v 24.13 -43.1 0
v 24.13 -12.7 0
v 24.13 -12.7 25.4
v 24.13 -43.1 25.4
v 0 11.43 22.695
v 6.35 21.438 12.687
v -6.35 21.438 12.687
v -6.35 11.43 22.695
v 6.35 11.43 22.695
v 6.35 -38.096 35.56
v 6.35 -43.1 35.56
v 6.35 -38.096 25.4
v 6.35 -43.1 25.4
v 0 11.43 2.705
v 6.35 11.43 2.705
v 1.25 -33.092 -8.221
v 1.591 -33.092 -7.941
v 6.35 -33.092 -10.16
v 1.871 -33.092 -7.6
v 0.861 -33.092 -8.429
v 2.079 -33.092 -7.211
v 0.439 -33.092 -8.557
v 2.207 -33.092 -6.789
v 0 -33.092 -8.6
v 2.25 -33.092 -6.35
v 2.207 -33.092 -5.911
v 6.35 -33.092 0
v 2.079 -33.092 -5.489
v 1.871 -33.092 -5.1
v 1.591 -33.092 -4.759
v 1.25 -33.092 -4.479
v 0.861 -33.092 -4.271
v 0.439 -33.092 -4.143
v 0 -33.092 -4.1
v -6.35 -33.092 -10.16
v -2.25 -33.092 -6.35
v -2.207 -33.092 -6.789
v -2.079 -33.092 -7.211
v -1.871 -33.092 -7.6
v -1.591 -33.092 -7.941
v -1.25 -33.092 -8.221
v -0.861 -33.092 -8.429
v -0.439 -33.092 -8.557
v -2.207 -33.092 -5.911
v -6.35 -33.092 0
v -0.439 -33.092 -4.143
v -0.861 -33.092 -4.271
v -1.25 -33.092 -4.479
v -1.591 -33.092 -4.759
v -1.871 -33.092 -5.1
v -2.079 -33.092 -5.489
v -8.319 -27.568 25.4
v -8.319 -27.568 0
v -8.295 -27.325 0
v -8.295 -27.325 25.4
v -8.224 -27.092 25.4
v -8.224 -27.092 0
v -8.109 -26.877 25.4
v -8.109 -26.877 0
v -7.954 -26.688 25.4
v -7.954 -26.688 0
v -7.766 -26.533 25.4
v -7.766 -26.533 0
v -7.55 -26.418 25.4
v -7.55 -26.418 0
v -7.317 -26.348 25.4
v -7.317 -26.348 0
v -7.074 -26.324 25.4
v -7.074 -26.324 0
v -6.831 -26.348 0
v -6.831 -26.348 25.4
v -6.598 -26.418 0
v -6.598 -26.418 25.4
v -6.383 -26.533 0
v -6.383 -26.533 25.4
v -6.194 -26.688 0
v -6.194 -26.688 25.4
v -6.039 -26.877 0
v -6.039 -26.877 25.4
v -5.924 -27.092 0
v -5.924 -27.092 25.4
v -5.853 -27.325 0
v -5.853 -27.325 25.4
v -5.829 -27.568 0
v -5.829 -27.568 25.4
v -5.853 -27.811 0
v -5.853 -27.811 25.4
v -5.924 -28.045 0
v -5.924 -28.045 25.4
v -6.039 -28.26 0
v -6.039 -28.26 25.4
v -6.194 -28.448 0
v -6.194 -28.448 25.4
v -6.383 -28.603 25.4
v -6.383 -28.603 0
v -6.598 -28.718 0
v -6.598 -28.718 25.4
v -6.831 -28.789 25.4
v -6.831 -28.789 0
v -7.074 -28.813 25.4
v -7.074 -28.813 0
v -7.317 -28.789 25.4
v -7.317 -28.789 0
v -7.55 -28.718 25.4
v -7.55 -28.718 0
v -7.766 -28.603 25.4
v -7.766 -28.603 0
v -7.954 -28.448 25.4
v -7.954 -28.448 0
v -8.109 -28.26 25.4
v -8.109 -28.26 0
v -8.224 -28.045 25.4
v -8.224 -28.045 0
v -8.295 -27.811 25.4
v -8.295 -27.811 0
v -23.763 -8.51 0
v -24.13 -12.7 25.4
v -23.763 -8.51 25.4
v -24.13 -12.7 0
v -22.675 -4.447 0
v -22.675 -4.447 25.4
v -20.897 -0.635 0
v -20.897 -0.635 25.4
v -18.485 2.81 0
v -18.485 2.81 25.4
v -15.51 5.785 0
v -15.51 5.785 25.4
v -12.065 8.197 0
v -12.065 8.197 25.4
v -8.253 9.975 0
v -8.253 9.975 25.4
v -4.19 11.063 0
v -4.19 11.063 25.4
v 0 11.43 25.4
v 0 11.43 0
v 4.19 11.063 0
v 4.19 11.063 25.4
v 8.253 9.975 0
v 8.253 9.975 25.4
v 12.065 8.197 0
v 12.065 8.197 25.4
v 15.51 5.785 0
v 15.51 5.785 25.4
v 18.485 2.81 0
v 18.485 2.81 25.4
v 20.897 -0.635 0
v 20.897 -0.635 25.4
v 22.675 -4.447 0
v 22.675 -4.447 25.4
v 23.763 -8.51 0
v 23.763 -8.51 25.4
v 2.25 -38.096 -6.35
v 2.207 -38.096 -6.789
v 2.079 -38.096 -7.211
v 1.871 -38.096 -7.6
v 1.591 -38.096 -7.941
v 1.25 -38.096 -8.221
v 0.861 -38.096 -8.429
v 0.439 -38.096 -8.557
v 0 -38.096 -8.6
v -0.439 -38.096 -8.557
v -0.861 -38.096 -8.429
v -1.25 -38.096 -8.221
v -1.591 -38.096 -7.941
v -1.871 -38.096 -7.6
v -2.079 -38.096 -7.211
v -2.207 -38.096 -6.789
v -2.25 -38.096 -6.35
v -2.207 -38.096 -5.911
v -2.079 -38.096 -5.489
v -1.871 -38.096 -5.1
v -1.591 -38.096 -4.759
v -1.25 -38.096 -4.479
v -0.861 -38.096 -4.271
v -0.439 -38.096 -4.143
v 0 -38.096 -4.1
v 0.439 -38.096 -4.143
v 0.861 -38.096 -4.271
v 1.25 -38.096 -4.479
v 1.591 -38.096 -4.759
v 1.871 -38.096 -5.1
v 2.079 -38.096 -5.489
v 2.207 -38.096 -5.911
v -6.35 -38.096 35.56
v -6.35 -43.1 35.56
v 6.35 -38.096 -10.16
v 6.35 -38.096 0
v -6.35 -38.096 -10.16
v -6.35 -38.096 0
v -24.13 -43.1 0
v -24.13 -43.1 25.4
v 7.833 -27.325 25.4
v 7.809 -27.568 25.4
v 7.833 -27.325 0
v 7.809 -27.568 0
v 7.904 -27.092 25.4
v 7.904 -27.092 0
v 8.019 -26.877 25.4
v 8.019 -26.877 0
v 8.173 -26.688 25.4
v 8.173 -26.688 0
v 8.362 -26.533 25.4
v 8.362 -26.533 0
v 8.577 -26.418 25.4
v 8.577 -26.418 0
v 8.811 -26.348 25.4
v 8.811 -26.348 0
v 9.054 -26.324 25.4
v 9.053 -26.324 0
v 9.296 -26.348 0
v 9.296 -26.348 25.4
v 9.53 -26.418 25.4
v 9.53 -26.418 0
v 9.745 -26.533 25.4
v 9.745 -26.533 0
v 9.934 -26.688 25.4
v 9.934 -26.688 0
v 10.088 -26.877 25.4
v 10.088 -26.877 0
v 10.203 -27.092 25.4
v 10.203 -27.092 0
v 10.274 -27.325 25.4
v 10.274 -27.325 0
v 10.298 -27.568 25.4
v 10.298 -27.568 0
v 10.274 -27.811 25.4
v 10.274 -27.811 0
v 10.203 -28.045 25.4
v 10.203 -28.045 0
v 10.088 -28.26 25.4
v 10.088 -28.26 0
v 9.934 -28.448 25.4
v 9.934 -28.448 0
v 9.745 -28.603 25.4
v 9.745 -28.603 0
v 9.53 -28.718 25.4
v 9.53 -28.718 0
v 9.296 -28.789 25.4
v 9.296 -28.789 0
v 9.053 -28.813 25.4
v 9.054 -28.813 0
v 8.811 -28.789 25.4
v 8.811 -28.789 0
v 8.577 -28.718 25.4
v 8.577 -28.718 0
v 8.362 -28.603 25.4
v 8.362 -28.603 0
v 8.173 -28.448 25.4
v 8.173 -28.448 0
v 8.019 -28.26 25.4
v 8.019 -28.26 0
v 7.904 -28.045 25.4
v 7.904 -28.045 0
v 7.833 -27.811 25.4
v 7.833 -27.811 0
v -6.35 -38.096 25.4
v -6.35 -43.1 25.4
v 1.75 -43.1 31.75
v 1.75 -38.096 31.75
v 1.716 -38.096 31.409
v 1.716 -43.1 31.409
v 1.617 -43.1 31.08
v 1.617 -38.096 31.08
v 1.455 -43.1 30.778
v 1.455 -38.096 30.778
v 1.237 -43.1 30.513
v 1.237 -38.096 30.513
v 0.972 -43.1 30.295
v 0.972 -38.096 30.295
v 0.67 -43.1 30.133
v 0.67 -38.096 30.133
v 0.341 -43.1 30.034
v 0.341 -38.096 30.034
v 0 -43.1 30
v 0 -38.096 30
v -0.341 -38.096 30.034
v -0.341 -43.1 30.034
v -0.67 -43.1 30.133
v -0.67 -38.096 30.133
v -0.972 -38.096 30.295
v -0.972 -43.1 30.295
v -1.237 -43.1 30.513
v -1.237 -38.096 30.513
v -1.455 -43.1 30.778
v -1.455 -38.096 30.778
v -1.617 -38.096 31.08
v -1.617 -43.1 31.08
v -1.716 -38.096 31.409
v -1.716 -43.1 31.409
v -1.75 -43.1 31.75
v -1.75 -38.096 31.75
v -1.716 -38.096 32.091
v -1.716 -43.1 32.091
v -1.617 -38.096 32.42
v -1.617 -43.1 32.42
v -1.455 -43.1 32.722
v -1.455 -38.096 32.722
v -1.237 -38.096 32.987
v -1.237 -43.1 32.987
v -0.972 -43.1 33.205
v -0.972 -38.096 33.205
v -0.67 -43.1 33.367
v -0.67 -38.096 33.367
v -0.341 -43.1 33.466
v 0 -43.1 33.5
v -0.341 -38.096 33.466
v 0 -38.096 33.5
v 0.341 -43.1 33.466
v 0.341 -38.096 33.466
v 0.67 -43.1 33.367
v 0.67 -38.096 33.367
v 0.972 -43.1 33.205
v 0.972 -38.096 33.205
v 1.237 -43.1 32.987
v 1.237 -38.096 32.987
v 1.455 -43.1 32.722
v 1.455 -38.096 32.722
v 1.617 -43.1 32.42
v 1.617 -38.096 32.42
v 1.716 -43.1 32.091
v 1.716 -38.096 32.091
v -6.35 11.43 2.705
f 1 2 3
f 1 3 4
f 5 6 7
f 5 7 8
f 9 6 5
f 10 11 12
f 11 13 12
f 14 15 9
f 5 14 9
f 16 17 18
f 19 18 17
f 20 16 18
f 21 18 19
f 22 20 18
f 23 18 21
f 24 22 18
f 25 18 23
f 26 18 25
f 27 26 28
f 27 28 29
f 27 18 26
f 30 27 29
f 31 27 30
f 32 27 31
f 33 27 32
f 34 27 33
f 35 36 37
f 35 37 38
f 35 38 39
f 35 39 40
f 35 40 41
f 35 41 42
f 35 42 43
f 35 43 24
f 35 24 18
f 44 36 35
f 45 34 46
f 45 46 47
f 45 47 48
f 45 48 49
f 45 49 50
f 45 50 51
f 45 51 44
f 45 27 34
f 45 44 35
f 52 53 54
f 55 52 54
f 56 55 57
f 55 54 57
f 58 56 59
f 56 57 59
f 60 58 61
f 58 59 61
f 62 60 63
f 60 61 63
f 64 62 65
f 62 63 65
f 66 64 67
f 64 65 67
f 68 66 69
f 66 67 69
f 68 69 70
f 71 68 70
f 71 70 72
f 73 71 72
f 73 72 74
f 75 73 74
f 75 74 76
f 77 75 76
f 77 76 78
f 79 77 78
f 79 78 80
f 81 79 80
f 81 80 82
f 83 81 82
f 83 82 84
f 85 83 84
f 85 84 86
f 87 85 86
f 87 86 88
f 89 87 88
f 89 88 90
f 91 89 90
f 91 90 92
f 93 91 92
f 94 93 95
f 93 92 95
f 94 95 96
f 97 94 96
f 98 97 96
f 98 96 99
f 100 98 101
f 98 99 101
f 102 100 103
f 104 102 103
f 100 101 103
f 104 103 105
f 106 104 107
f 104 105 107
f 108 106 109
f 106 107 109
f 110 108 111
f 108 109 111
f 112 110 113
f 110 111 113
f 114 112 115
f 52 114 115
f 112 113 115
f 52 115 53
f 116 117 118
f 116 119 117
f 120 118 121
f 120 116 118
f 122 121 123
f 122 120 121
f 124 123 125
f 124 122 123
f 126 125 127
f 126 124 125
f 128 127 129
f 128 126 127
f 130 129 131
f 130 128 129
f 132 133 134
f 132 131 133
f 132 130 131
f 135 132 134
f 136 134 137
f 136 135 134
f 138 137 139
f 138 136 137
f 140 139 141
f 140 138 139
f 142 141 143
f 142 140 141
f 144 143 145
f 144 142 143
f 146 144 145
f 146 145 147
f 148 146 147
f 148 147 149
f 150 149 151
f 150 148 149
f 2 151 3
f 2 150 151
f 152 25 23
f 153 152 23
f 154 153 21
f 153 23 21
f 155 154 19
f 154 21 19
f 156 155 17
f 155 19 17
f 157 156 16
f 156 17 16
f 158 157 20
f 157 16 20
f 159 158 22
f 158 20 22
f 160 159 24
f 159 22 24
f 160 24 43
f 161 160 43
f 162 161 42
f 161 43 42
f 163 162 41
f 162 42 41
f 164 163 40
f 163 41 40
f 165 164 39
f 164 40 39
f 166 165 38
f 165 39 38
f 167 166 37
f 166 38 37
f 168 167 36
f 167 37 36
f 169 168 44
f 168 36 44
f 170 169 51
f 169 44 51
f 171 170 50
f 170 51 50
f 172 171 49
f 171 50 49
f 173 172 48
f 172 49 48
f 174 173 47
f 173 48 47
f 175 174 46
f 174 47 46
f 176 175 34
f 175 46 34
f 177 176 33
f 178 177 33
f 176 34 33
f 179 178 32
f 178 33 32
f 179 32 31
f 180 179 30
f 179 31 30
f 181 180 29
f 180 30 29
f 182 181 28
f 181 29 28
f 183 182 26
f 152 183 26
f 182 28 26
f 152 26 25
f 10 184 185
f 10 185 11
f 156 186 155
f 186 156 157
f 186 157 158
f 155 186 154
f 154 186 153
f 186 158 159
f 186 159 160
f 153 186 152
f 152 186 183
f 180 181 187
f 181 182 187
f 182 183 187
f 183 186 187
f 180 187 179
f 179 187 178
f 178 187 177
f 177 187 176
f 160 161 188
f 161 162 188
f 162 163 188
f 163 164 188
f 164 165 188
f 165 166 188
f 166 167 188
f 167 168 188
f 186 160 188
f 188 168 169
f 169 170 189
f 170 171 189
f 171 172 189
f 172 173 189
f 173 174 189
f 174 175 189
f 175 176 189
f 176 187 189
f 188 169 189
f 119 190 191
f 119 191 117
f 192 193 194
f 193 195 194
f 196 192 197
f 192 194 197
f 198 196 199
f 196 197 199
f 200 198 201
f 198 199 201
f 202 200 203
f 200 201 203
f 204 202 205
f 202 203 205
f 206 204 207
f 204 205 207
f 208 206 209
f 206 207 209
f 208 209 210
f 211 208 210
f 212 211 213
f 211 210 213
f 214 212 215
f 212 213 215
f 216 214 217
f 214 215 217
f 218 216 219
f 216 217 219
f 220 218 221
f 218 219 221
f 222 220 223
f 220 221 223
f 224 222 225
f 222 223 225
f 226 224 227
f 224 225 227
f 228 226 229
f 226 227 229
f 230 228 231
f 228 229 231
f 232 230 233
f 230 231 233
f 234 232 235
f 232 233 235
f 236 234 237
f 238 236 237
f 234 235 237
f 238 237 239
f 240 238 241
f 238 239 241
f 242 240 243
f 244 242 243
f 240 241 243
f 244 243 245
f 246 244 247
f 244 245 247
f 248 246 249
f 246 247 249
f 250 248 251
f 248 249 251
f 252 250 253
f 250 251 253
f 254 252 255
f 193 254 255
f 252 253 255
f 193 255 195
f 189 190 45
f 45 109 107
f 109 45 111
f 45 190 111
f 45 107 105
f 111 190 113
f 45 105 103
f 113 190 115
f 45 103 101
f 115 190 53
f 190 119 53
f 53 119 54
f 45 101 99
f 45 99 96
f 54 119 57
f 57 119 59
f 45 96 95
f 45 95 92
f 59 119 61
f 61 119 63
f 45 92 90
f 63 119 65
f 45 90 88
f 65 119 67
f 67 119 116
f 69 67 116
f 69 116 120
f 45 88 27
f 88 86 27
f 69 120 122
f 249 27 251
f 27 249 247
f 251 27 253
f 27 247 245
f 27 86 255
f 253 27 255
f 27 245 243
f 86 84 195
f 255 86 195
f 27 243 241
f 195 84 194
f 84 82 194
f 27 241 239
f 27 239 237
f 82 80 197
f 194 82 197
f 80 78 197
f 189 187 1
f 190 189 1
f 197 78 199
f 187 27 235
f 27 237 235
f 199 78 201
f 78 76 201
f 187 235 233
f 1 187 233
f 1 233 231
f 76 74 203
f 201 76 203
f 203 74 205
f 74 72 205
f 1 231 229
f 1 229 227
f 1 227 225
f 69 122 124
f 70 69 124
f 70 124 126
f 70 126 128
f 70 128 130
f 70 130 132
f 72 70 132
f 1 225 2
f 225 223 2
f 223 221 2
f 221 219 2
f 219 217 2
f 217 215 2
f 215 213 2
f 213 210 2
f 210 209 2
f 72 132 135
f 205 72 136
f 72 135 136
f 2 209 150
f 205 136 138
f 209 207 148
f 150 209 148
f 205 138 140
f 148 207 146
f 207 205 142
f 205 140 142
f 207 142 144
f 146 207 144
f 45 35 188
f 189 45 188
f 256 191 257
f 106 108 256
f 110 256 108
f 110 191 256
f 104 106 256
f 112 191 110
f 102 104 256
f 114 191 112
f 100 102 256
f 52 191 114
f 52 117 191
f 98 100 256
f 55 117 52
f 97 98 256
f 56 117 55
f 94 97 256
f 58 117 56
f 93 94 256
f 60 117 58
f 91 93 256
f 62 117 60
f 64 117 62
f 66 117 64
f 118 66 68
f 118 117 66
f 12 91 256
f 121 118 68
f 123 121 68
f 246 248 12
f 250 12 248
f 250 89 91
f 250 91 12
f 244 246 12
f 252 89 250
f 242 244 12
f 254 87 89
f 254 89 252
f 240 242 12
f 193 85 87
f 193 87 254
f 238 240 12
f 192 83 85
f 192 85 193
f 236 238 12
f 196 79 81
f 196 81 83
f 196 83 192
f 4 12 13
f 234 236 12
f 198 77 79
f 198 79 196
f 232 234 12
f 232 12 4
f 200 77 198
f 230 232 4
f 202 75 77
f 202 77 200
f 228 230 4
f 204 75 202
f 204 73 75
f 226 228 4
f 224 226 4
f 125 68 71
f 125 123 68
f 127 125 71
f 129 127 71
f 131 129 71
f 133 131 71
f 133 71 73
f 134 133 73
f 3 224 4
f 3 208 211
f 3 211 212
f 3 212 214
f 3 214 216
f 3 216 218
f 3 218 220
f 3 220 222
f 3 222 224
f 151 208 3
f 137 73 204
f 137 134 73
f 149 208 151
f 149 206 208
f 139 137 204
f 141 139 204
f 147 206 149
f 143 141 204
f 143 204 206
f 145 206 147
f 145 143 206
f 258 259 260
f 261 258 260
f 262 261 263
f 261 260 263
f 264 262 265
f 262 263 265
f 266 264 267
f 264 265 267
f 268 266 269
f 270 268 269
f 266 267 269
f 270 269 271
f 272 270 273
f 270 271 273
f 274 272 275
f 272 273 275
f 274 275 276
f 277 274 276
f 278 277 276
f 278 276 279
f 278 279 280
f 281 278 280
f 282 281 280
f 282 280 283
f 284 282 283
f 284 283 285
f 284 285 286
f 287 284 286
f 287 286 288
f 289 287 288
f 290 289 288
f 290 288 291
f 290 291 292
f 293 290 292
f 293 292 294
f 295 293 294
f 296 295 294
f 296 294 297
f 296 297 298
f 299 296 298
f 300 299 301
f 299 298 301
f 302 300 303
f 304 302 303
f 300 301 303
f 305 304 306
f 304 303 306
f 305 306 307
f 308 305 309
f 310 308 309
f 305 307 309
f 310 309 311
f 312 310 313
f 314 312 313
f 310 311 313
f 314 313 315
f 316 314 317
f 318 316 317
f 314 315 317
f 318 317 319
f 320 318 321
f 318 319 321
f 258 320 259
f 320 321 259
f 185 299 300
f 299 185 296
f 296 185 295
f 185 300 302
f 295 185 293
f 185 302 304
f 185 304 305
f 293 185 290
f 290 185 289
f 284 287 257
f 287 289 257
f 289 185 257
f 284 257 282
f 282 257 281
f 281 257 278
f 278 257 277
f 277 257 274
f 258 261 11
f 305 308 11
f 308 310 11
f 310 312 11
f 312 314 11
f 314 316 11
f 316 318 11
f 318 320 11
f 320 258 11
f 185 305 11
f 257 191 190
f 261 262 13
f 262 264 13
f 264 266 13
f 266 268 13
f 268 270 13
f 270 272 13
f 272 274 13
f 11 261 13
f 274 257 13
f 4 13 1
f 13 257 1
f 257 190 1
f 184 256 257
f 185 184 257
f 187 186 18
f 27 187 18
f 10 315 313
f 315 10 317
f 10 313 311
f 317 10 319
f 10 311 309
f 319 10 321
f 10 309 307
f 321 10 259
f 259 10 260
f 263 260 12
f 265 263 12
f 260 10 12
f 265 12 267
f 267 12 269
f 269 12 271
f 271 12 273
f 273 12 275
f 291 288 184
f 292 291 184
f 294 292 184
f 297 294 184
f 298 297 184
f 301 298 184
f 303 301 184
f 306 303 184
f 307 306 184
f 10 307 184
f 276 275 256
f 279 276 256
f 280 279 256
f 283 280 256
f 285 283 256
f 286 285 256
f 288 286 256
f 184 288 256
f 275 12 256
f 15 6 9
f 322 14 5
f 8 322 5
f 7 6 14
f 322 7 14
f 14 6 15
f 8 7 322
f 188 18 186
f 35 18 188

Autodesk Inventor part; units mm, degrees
ref_plane "YZ Plane" through (0, 0, 0) normal (1, 0, 0) x (0, 1, 0)
ref_plane "XZ Plane" through (0, 0, 0) normal (0, 1, 0) x (-1, 0, 0)
sketch "Sketch1" plane through (0, 0, 0) normal (0, 0, 1) x (1, 0, 0)
  line L0 (-21.6147, -38.1) -> (42.5469, -38.1) projected
  line L1 (6.35, -38.0962) -> (6.35, -43.1) projected
  line L2 (6.35, -43.1) -> (22.86, -43.1) projected
  line L3 (22.86, -43.1) -> (22.86, 0) projected
  arc A0 (22.86, 0) -> (-22.86, 0) centre (0, 0) ccw projected
  line L4 (-22.86, 0) -> (-22.86, -43.1) projected
  line L5 (-22.86, -43.1) -> (-6.35, -43.1) projected
  line L6 (-6.35, -43.1) -> (-6.35, -38.0962) projected
  line L7 (-6.35, -38.0962) -> (6.35, -38.0962) projected
  line L8 (17.78, -43.1) -> (-24.13, -43.1)
  line L9 (-24.13, -43.1) -> (24.13, -43.1)
  line L10 (0, 0) -> (0, -12.7)
  circle A1 centre (0, -12.7) radius 24.13
  line L11 (-24.13, -12.7) -> (24.13, -12.7)
  line L12 (24.13, -12.7) -> (24.13, -43.1)
  line L13 (24.13, -43.1) -> (-24.13, -43.1)
  line L14 (-24.13, -43.1) -> (-24.13, -12.7)
  dimension "d20" = 48.26
  dimension "d19" = 12.7
extrude "Extrusion1" add sketch "Sketch1" along normal blind 25.4 contours L6 L7 L1 L0 | L0 L1 L8 L6 | L6 L5 L4 A1 L3 L0 L1 L7 | L0 L3 L2 L1 | L3 A1 L12 L0 | L0 L12 L9 L3 | L8 L14 A1 L4 | A1 L4 L11 L3 | L3 L11 A1 | A1 L11 L4 | L11 L3 A1 | L11 L4 A1 L3 | L11 A1 L4
sketch "Sketch2" plane through (0, 0, 0) normal (0, 0, -1) x (-1, 0, 0)
  line L0 (6.35, -43.1) -> (-6.35, -43.1) projected
  line L1 (-6.35, -43.1) -> (-6.35, -38.0962) projected
  line L2 (-6.35, -38.0962) -> (6.35, -38.0962) projected
  line L3 (6.35, -38.0962) -> (6.35, -43.1) projected
  line L4 (6.35, -38.0962) -> (-6.35, -38.0962)
  line L5 (-6.35, -38.0962) -> (-6.35, -33.0924)
  line L6 (-6.35, -33.0924) -> (6.35, -33.0924)
  line L7 (6.35, -33.0924) -> (6.35, -38.0962)
  point P0 (0, 0)
  dimension "d3" = 5.0038
extrude "Extrusion2" add sketch "Sketch2" along normal blind 10.16 contours L2 L5 L6 L7
sketch "Sketch3" plane through (-6.35, -33.0924, 0) normal (0, 1, 0) x (1, 0, 0)
  line L0 (12.7, 10.16) -> (0, 10.16) projected
  line L1 (6.35, 10.16) -> (6.35, 6.35)
  circle A0 centre (6.35, 6.35) radius 2.25
  point P0 (6.35, 0)
  dimension "d6" = 3.81
  dimension "d7" = 4.5
extrude "Extrusion3" cut sketch "Sketch3" against normal blind 10.16
sketch "Sketch4" plane through (0, 0, 25.4) normal (0, 0, 1) x (1, 0, 0)
  line L0 (0, -43.1) -> (6.35, -43.1)
  line L1 (6.35, -43.1) -> (-6.35, -43.1)
  line L2 (-6.35, -43.1) -> (6.35, -43.1)
  line L3 (6.35, -43.1) -> (6.35, -38.0962)
  line L4 (6.35, -38.0962) -> (-6.35, -38.0962)
  line L5 (-6.35, -38.0962) -> (-6.35, -43.1)
  point P0 (0, 0)
  dimension "d10" = 6.35
  dimension "d11" = 12.7
  dimension "d12" = 5.0038
extrude "Extrusion4" add sketch "Sketch4" along normal blind 10.16
sketch "Sketch5" plane through (-6.35, -38.0962, 25.4) normal (0, 1, 0) x (1, 0, 0)
  line L0 (0, -10.16) -> (12.7, -10.16) projected
  line L1 (6.35, -10.16) -> (6.35, -6.35)
  circle A0 centre (6.35, -6.35) radius 1.75
  point P0 (6.35, 25.4)
  dimension "d15" = 3.81
  dimension "d16" = 3.5
extrude "Extrusion5" cut sketch "Sketch5" against normal blind 10.16
ref_plane "Work Plane1" through (0, -43.1, 0) normal (-1, 0, 0) x (0, 0, 1)
sketch "Sketch6" plane through (0, -43.1, 0) normal (-1, 0, 0) x (0, 0, 1)
  line L0 (0, 54.53) -> (0, 30.4) projected
  line L1 (0, 54.53) -> (2.7051, 54.53)
  line L2 (0, 54.53) -> (25.4, 54.53) projected
  line L3 (2.7051, 54.53) -> (22.6949, 54.53)
  line L4 (22.6949, 54.53) -> (12.6873, 54.53)
  line L5 (12.6873, 54.53) -> (12.6873, 64.5376)
  line L6 (12.6873, 64.5376) -> (22.6949, 54.53)
  line L7 (12.6873, 64.5376) -> (2.7051, 54.53)
  point P0 (0, 43.1)
  dimension "d22" = 2.7051
  dimension "d23" = 19.9898
  dimension "d24" = 10.0076
  dimension "d25" = 10.0076
extrude "Extrusion6" add sketch "Sketch6" along normal mid plane 12.7
sketch "Sketch7" plane through (0, 0, 0) normal (0, 0, -1) x (-1, 0, 0)
  ellipse E0 centre (-10.0535, -27.5683) end of major axis (-10.0535, -26.3237) minor radius 1.2444 projected
  ellipse E1 centre (8.0741, -27.5683) end of major axis (8.0741, -26.3237) minor radius 1.2444 projected
  line L0 (-10.0535, -27.5683) -> (-9.0535, -27.5683)
  circle A0 centre (-9.0535, -27.5683) radius 1.2446
  line L1 (8.0741, -27.5683) -> (7.0741, -27.5683)
  circle A1 centre (7.0741, -27.5683) radius 1.2446
  point P0 (0, 0)
  dimension "d28" = 1
  dimension "d29" = 2.4892
  dimension "d30" = 1
  dimension "d31" = 2.4892
extrude "Extrusion7" cut sketch "Sketch7" against normal blind 25.4 contours A0 E0 | E0 A0 | A1 E1 | E1 A1 picked at (-9.7984, -27.3936) picked at (-8.155, -27.4665) picked at (7.819, -27.743) picked at (6.1756, -27.6701)
properties part number "Tail5"
